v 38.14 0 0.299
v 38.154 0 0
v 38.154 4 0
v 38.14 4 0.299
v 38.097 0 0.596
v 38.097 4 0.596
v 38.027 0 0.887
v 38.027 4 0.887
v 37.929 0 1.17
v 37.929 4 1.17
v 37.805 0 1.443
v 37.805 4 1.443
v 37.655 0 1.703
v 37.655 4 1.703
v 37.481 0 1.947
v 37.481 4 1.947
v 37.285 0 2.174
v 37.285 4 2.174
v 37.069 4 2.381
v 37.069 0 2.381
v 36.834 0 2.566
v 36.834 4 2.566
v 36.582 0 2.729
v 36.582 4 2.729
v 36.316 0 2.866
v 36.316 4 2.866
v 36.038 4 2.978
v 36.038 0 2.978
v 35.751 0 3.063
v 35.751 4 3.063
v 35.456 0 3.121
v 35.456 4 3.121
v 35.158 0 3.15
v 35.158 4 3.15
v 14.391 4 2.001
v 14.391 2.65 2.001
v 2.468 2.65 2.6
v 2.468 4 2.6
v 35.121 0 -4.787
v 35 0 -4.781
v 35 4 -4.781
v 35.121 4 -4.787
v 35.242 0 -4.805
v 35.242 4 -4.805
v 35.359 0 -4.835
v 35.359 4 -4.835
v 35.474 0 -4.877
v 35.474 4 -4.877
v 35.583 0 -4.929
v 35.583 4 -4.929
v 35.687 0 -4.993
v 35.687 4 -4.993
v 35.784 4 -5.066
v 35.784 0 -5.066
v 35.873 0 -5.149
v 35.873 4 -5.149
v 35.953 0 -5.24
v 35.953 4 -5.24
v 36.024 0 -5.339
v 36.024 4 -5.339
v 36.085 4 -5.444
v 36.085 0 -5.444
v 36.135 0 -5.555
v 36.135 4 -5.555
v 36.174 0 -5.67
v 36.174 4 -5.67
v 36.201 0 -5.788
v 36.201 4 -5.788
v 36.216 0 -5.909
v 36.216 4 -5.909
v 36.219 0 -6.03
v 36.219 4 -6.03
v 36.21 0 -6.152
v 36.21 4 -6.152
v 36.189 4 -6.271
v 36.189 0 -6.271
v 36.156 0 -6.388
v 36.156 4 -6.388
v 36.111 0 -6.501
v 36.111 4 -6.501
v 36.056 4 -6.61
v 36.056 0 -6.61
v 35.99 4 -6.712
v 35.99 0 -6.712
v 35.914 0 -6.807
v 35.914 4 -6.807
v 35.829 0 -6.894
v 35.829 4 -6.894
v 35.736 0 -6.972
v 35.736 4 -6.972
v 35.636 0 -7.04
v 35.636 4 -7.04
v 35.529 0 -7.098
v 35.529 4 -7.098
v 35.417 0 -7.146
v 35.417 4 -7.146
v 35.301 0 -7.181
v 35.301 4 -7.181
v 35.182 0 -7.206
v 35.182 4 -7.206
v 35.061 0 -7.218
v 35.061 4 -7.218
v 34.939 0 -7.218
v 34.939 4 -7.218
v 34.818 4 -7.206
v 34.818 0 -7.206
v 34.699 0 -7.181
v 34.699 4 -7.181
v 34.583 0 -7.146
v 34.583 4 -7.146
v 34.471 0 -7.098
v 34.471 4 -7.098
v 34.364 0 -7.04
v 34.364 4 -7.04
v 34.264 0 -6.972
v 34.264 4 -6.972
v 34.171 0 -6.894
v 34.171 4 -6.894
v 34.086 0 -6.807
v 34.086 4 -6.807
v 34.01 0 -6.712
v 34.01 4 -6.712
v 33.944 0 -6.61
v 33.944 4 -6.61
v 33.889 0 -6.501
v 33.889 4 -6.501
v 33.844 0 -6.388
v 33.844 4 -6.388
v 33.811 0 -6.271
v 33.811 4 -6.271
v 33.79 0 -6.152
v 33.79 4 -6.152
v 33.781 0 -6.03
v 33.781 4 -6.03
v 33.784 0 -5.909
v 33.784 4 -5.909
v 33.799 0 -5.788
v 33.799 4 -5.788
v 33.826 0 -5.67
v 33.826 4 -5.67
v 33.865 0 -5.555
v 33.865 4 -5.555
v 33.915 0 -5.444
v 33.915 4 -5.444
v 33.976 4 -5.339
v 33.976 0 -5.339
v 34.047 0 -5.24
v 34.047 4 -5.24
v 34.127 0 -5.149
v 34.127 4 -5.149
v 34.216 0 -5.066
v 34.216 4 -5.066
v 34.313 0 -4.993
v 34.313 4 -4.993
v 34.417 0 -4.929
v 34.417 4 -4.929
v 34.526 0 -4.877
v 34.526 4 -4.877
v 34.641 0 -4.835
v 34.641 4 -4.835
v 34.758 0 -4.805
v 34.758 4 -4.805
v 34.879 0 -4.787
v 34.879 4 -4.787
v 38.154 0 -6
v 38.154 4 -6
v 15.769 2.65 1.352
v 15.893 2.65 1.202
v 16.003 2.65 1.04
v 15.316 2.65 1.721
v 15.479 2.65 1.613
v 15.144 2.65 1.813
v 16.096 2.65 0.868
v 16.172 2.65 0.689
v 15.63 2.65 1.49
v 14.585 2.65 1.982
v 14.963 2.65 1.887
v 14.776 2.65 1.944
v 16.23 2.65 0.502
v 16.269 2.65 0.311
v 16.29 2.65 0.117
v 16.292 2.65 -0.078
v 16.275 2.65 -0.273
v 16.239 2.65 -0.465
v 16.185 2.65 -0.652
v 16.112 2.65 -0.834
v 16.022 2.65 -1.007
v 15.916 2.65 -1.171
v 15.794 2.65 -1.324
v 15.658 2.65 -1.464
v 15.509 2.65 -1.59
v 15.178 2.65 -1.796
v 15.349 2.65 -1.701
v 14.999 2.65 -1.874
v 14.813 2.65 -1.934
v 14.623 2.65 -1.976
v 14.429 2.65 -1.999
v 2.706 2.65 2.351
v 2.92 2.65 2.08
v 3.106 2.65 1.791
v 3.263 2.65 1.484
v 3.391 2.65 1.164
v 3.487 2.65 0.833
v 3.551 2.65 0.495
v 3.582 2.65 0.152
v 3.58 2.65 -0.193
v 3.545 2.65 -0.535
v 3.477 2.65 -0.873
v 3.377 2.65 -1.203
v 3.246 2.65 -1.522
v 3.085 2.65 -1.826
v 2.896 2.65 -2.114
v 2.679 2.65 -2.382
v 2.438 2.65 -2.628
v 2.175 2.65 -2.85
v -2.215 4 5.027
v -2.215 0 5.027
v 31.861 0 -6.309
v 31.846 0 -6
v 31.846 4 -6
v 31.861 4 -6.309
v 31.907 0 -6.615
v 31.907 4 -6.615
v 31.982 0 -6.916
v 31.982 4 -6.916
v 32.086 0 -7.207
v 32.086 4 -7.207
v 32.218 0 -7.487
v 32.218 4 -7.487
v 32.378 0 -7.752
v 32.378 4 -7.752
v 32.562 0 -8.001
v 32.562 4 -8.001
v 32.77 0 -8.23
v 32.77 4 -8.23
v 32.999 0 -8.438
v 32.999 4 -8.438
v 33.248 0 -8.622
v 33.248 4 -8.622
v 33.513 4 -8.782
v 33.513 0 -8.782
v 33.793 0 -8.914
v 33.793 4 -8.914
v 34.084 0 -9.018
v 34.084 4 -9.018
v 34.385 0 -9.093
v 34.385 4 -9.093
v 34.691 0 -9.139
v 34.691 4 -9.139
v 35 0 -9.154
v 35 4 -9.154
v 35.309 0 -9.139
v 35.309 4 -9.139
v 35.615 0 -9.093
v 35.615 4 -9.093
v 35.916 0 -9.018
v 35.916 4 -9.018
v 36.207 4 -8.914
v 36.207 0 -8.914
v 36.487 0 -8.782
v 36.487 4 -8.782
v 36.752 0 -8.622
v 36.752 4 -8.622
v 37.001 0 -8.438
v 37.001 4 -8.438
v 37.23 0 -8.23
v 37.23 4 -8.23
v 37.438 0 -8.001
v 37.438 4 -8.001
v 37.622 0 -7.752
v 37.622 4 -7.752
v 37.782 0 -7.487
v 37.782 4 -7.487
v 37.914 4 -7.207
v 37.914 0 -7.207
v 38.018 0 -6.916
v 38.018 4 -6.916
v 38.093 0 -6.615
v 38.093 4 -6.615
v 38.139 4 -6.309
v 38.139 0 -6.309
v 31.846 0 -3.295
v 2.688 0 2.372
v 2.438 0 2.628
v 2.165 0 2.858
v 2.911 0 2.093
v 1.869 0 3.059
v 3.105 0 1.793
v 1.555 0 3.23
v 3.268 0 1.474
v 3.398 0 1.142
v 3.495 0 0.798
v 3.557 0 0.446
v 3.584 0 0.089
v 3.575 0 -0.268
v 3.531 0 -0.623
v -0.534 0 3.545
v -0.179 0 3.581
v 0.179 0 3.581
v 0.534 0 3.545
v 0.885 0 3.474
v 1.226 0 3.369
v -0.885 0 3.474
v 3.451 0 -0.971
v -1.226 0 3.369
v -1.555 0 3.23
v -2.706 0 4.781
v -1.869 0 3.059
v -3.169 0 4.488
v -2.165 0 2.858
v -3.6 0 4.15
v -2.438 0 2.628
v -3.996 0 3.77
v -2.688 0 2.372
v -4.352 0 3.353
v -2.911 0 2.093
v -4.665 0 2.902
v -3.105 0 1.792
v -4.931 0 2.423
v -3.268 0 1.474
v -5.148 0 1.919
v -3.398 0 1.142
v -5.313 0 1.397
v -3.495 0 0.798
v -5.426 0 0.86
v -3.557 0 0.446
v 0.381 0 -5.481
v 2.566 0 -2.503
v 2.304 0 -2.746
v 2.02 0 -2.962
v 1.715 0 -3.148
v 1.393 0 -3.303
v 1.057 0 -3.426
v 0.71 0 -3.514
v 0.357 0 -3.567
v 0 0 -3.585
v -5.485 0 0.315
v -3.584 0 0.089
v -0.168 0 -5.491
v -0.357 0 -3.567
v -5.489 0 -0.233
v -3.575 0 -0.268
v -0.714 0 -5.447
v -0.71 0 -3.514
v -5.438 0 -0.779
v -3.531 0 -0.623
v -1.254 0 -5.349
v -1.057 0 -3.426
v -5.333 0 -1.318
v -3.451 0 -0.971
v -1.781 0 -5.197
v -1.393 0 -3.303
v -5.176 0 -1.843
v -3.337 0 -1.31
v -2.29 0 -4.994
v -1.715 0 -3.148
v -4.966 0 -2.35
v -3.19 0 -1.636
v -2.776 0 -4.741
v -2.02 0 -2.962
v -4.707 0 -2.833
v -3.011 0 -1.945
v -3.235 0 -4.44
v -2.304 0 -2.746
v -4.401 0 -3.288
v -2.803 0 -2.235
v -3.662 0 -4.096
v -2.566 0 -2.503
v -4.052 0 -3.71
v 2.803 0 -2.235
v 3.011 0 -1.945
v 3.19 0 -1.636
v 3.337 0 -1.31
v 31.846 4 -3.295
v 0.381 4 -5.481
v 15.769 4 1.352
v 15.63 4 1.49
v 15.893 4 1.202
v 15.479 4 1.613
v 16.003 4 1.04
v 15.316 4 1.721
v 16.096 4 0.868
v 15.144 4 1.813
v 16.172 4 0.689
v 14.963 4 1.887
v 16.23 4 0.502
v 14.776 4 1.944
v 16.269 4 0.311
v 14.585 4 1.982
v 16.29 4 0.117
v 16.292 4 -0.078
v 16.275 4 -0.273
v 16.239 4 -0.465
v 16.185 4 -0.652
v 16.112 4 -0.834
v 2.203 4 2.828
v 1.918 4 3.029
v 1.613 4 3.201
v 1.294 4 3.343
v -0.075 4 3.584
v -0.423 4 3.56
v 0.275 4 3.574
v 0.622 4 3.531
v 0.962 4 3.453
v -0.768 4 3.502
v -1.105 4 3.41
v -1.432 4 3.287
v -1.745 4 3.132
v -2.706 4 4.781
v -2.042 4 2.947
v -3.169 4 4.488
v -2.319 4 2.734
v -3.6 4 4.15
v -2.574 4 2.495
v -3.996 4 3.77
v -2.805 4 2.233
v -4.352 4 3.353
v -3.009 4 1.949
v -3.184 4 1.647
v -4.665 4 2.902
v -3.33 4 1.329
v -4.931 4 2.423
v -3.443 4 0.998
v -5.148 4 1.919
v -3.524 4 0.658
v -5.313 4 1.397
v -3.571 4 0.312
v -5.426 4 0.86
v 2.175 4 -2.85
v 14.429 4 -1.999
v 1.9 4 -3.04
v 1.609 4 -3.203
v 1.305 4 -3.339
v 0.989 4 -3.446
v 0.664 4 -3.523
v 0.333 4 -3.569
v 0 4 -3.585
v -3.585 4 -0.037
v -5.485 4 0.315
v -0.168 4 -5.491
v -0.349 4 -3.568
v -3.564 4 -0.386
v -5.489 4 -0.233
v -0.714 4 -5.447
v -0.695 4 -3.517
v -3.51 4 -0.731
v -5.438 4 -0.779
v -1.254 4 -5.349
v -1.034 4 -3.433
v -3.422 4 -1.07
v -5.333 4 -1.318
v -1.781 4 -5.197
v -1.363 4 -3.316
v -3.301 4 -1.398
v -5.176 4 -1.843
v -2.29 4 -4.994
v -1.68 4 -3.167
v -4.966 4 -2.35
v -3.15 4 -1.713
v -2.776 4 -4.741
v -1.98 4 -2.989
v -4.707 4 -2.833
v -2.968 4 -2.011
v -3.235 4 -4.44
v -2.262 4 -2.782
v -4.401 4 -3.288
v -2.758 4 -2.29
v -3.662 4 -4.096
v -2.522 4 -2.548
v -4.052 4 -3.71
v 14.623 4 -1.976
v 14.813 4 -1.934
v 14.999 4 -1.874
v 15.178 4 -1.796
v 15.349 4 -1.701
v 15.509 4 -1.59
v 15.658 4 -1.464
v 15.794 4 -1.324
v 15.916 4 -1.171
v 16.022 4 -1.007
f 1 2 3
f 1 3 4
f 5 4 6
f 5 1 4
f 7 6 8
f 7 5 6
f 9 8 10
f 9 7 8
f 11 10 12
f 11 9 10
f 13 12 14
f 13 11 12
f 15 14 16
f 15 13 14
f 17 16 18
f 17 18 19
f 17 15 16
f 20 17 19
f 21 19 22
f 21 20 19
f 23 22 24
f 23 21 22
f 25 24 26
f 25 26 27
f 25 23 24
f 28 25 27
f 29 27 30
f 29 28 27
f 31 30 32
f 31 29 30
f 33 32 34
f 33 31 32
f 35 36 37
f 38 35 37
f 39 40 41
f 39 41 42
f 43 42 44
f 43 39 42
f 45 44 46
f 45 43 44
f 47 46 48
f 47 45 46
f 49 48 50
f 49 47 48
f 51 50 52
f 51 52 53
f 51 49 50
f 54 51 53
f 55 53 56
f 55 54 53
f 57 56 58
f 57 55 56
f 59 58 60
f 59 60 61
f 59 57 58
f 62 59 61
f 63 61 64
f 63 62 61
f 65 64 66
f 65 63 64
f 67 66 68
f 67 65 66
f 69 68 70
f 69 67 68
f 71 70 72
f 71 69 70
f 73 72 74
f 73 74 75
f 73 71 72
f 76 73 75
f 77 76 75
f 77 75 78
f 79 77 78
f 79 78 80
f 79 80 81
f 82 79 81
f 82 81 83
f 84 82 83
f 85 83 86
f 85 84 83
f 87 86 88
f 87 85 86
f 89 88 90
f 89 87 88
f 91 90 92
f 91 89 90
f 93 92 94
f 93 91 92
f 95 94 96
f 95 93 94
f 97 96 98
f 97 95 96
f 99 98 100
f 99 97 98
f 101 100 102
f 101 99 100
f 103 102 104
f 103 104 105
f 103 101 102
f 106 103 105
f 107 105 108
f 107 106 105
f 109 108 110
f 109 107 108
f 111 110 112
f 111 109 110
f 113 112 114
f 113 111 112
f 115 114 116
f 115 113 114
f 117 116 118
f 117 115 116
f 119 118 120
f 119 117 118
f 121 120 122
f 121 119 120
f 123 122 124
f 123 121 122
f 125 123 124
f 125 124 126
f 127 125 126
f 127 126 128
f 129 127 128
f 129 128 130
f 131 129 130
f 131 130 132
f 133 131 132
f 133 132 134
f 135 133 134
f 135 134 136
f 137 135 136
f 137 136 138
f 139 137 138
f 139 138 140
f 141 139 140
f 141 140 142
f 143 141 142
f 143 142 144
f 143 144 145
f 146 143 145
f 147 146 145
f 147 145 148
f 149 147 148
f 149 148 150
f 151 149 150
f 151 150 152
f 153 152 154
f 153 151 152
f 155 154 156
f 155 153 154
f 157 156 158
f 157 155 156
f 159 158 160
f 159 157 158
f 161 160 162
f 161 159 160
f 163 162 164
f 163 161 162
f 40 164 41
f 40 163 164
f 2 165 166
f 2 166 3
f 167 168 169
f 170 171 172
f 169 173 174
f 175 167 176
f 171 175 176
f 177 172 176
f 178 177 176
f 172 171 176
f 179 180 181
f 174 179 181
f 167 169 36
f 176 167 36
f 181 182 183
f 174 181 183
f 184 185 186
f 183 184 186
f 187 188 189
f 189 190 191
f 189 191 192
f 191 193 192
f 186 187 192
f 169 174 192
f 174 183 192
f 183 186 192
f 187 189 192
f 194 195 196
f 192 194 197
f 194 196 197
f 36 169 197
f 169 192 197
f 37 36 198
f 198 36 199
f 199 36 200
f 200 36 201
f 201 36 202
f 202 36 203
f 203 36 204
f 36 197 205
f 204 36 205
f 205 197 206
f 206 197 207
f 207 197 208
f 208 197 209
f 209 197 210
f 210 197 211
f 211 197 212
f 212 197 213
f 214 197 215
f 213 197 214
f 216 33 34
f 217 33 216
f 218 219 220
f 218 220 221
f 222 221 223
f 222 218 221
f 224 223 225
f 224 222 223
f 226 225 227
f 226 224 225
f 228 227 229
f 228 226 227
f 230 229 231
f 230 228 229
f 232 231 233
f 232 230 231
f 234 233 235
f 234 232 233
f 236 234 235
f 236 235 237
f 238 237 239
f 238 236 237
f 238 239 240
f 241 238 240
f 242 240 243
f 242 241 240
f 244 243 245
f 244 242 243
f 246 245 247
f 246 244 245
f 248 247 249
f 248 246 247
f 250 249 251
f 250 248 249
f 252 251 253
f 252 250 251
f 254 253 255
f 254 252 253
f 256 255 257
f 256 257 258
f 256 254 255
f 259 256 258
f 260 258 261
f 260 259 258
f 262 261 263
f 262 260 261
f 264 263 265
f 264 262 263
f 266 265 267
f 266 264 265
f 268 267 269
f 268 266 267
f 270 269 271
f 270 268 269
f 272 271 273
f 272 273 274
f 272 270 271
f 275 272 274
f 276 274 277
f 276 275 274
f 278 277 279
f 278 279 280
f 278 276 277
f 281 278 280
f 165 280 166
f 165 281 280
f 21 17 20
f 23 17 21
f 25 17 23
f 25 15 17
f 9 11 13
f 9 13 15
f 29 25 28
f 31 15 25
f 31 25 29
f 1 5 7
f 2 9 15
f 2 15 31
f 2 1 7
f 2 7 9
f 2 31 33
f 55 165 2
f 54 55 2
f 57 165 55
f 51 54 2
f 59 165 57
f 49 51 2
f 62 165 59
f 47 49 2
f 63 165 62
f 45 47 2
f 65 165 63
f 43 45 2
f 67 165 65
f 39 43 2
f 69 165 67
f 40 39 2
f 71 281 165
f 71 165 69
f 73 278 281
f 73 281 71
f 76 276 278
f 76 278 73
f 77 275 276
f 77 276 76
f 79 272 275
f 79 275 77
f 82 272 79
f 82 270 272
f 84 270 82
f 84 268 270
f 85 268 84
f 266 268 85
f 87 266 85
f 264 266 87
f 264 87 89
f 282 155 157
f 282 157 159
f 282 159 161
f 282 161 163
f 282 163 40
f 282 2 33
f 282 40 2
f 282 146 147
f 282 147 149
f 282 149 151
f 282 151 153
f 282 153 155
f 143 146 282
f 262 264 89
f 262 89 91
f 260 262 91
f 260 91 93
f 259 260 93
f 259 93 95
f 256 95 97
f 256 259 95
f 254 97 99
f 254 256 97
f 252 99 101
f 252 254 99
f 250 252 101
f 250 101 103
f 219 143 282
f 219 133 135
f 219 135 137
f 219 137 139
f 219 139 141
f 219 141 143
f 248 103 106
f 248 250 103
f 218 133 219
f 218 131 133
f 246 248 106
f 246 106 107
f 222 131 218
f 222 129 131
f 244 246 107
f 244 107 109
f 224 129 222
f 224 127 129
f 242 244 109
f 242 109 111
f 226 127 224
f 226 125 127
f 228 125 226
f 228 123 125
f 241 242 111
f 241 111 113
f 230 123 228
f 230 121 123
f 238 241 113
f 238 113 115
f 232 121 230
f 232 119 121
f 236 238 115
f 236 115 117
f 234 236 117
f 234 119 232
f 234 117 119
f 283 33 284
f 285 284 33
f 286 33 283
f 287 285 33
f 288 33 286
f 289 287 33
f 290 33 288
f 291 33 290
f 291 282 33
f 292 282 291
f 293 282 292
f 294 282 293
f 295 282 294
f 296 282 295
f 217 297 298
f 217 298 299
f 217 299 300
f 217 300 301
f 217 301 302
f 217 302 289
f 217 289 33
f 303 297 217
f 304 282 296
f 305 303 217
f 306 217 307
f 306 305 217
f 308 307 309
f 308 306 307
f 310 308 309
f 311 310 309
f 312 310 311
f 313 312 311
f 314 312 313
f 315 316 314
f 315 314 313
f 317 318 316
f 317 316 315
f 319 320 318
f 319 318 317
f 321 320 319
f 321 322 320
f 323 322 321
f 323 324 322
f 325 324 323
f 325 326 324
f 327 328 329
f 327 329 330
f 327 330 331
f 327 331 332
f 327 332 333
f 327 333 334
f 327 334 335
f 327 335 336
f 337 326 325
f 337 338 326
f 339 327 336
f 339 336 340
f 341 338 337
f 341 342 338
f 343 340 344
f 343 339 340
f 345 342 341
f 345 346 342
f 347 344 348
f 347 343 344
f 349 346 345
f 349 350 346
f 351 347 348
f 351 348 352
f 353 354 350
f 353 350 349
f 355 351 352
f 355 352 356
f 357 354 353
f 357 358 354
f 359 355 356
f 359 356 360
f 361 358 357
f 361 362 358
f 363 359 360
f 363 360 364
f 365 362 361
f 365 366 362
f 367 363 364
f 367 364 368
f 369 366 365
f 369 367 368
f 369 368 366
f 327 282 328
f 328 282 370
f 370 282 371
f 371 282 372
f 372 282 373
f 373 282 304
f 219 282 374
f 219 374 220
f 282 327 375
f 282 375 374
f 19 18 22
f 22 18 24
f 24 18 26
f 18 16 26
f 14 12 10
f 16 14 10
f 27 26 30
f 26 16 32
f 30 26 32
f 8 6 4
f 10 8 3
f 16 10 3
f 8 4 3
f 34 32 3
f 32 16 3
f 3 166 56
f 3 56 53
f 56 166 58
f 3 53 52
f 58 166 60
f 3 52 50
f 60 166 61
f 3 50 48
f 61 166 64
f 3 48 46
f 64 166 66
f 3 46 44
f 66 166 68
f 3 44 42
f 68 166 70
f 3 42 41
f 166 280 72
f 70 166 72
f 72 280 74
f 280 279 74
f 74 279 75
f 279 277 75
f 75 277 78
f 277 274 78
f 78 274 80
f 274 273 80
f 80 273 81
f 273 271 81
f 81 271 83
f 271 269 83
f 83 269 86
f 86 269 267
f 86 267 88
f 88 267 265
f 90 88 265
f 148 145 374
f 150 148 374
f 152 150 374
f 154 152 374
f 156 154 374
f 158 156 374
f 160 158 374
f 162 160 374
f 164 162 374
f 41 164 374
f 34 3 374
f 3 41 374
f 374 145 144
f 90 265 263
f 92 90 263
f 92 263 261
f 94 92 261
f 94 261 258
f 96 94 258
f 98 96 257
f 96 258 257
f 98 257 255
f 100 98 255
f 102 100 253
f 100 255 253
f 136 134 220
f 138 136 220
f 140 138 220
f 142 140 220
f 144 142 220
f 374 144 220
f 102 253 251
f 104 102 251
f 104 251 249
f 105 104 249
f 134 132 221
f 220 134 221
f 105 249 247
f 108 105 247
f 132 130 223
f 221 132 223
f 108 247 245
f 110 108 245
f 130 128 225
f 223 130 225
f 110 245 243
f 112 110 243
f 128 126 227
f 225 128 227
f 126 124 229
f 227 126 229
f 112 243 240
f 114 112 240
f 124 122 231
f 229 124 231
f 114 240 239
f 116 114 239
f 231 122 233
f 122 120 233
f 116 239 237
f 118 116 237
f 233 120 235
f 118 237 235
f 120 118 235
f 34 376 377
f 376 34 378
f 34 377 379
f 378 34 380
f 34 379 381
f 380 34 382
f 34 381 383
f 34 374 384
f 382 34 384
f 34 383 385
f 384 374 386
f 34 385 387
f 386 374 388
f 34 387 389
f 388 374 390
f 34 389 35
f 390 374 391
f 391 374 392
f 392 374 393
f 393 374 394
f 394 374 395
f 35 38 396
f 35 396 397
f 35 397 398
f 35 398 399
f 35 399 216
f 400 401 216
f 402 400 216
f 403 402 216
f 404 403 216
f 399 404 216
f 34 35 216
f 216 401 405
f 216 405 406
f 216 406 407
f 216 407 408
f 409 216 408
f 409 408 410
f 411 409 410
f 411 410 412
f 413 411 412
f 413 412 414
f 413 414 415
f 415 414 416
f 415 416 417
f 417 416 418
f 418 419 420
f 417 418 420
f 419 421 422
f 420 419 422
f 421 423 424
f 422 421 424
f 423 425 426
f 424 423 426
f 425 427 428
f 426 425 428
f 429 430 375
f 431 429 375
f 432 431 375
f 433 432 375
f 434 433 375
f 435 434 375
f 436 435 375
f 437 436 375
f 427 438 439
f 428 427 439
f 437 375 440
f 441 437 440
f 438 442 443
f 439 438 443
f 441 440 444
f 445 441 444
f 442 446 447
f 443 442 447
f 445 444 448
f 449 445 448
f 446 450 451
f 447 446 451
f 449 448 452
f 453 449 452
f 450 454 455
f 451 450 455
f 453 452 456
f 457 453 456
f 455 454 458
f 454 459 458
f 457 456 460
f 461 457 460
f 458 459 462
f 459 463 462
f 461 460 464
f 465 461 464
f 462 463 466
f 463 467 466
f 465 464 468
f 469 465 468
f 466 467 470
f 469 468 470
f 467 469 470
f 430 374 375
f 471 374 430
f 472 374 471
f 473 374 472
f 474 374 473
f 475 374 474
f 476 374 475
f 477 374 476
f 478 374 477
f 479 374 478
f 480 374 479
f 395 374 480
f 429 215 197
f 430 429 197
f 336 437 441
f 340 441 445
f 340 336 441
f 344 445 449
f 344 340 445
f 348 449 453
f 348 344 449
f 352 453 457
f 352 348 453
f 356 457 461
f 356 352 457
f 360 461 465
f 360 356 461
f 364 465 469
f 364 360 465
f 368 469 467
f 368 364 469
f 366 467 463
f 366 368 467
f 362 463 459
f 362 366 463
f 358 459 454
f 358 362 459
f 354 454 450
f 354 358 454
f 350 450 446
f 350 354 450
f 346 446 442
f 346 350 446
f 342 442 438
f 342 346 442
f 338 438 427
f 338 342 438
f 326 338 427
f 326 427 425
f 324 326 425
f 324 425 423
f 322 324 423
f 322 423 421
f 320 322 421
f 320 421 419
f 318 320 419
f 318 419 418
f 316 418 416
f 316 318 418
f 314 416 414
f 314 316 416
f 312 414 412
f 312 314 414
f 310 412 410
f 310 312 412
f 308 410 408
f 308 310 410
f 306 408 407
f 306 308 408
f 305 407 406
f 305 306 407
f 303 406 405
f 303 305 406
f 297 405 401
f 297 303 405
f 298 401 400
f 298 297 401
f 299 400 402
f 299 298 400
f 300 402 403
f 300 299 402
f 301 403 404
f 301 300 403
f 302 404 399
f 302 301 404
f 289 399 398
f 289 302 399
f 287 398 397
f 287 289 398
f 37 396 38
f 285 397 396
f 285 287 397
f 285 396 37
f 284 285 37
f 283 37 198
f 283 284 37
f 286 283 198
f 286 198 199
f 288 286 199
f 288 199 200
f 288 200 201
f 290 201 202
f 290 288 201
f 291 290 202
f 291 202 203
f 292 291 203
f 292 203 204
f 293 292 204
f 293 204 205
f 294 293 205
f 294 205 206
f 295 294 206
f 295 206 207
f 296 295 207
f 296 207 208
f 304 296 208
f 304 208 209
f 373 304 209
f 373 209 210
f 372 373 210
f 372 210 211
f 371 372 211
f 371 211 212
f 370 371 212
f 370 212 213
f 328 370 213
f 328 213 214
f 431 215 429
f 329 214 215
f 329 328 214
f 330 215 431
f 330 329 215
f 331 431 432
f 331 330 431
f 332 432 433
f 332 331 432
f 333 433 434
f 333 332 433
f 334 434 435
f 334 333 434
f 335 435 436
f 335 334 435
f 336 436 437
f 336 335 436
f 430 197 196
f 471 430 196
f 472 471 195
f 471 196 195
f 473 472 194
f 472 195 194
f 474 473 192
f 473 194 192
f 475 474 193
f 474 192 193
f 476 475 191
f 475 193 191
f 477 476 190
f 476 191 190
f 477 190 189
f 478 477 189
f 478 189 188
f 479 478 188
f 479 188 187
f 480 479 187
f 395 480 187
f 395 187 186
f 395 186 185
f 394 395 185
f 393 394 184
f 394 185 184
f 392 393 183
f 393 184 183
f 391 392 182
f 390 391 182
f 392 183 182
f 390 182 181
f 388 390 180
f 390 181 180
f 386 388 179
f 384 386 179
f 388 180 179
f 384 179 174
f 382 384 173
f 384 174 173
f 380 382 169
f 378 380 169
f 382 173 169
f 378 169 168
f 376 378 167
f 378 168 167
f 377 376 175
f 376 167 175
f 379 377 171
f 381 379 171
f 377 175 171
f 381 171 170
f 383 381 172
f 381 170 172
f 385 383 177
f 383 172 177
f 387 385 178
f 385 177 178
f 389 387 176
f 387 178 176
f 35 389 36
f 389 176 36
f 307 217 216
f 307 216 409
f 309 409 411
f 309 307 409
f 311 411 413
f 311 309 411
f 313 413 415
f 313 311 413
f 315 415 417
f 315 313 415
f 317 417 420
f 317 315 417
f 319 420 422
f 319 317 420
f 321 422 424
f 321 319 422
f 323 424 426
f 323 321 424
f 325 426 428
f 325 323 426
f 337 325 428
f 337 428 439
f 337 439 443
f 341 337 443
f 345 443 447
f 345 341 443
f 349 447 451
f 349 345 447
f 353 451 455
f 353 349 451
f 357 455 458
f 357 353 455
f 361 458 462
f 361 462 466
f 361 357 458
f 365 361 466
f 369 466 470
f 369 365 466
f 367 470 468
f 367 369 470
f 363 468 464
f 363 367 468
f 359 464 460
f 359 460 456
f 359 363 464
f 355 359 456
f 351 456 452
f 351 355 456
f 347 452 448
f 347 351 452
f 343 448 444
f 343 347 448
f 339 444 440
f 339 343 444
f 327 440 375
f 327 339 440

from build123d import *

# Parameters (mm, degrees)
BOSS_EXTRUDE1_START    = -1.35
BOSS_EXTRUDE1_DEPTH    = 1.35
SKETCH4_R              = 1.2192
BOSS_EXTRUDE2_DEPTH    = 4
BODY_DELETE1_OUTLINE_R = 2.45
BODY_DELETE1_DEPTH     = 4


# Read off the part's stored shape, not the designer's step: Body-Delete1
with BuildPart() as part:
    # Sketch2 → Revolve1 (revolve)
    with BuildSketch(Plane.XY, mode=Mode.PRIVATE) as revolve1_sk:
        Polygon((2.45, 0), (2.45, 2.25), (1.2, 2.25), (1.2, 3), (2.45, 3), (2.45, 4), (3.585, 4), (3.585, 0), align=None)
    revolve(revolve1_sk.sketch.rotate(Axis((0, 0, 0), (0, 1, 0)), 90), axis=Axis((0, 0, 0), (0, 1, 0)))

    # Sketch3 → Boss-Extrude1 (add)
    with BuildSketch(Plane(origin=(0, 4, 0), x_dir=(1, 0, 0), z_dir=(0, 1, 0)).offset(BOSS_EXTRUDE1_START)):
        with BuildLine():
            Line((2.174793094, 2.85), (14.4288372, 1.998853492))
            ThreePointArc((14.4288372, 1.998853492), (16.293577458, -0.019194273), (14.390517199, -2.001146508))
            Line((14.390517199, -2.001146508), (2.468243302, -2.6))
            ThreePointArc((2.468243302, -2.6), (3.579814485, 0.1927518), (2.174793094, 2.85))
        make_face()
    extrude(amount=BOSS_EXTRUDE1_DEPTH)


with BuildPart() as body_2:
    # Sketch4 → Boss-Extrude2 (new body)
    with BuildSketch(Plane(origin=(0, 0, 0), x_dir=(1, 0, 0), z_dir=(0, 1, 0))):
        with BuildLine():
            Line((0.380676568, 5.480639828), (31.845967375, 3.295110532))
            Line((31.845967375, 3.295110532), (31.845967375, 6))
            ThreePointArc((31.845967375, 6), (35, 9.154032625), (38.154032625, 6))
            Line((38.154032625, 6), (38.154032625, 0))
            ThreePointArc((38.154032625, 0), (37.285495002, -2.173576407), (35.158226963, -3.150061274))
            Line((35.158226963, -3.150061274), (-2.215454853, -5.027334022))
            ThreePointArc((-2.215454853, -5.027334022), (-5.333477425, 1.317704871), (0.380676568, 5.480639828))
        make_face()
        with Locations(Location((35, 6, 0), (0, 0, 270))):
            Circle(SKETCH4_R, mode=Mode.SUBTRACT)
    extrude(amount=BOSS_EXTRUDE2_DEPTH)

    # Combine1: cut part
    add(part.part, mode=Mode.SUBTRACT)

    # Body-Delete1 outline → Body-Delete1 (cut)
    with BuildSketch(Plane(origin=(0, 0, 0), x_dir=(1, 0, 0), z_dir=(0, 1, 0))):
        Circle(BODY_DELETE1_OUTLINE_R)
    extrude(amount=BODY_DELETE1_DEPTH, mode=Mode.SUBTRACT)


solid = body_2.part
